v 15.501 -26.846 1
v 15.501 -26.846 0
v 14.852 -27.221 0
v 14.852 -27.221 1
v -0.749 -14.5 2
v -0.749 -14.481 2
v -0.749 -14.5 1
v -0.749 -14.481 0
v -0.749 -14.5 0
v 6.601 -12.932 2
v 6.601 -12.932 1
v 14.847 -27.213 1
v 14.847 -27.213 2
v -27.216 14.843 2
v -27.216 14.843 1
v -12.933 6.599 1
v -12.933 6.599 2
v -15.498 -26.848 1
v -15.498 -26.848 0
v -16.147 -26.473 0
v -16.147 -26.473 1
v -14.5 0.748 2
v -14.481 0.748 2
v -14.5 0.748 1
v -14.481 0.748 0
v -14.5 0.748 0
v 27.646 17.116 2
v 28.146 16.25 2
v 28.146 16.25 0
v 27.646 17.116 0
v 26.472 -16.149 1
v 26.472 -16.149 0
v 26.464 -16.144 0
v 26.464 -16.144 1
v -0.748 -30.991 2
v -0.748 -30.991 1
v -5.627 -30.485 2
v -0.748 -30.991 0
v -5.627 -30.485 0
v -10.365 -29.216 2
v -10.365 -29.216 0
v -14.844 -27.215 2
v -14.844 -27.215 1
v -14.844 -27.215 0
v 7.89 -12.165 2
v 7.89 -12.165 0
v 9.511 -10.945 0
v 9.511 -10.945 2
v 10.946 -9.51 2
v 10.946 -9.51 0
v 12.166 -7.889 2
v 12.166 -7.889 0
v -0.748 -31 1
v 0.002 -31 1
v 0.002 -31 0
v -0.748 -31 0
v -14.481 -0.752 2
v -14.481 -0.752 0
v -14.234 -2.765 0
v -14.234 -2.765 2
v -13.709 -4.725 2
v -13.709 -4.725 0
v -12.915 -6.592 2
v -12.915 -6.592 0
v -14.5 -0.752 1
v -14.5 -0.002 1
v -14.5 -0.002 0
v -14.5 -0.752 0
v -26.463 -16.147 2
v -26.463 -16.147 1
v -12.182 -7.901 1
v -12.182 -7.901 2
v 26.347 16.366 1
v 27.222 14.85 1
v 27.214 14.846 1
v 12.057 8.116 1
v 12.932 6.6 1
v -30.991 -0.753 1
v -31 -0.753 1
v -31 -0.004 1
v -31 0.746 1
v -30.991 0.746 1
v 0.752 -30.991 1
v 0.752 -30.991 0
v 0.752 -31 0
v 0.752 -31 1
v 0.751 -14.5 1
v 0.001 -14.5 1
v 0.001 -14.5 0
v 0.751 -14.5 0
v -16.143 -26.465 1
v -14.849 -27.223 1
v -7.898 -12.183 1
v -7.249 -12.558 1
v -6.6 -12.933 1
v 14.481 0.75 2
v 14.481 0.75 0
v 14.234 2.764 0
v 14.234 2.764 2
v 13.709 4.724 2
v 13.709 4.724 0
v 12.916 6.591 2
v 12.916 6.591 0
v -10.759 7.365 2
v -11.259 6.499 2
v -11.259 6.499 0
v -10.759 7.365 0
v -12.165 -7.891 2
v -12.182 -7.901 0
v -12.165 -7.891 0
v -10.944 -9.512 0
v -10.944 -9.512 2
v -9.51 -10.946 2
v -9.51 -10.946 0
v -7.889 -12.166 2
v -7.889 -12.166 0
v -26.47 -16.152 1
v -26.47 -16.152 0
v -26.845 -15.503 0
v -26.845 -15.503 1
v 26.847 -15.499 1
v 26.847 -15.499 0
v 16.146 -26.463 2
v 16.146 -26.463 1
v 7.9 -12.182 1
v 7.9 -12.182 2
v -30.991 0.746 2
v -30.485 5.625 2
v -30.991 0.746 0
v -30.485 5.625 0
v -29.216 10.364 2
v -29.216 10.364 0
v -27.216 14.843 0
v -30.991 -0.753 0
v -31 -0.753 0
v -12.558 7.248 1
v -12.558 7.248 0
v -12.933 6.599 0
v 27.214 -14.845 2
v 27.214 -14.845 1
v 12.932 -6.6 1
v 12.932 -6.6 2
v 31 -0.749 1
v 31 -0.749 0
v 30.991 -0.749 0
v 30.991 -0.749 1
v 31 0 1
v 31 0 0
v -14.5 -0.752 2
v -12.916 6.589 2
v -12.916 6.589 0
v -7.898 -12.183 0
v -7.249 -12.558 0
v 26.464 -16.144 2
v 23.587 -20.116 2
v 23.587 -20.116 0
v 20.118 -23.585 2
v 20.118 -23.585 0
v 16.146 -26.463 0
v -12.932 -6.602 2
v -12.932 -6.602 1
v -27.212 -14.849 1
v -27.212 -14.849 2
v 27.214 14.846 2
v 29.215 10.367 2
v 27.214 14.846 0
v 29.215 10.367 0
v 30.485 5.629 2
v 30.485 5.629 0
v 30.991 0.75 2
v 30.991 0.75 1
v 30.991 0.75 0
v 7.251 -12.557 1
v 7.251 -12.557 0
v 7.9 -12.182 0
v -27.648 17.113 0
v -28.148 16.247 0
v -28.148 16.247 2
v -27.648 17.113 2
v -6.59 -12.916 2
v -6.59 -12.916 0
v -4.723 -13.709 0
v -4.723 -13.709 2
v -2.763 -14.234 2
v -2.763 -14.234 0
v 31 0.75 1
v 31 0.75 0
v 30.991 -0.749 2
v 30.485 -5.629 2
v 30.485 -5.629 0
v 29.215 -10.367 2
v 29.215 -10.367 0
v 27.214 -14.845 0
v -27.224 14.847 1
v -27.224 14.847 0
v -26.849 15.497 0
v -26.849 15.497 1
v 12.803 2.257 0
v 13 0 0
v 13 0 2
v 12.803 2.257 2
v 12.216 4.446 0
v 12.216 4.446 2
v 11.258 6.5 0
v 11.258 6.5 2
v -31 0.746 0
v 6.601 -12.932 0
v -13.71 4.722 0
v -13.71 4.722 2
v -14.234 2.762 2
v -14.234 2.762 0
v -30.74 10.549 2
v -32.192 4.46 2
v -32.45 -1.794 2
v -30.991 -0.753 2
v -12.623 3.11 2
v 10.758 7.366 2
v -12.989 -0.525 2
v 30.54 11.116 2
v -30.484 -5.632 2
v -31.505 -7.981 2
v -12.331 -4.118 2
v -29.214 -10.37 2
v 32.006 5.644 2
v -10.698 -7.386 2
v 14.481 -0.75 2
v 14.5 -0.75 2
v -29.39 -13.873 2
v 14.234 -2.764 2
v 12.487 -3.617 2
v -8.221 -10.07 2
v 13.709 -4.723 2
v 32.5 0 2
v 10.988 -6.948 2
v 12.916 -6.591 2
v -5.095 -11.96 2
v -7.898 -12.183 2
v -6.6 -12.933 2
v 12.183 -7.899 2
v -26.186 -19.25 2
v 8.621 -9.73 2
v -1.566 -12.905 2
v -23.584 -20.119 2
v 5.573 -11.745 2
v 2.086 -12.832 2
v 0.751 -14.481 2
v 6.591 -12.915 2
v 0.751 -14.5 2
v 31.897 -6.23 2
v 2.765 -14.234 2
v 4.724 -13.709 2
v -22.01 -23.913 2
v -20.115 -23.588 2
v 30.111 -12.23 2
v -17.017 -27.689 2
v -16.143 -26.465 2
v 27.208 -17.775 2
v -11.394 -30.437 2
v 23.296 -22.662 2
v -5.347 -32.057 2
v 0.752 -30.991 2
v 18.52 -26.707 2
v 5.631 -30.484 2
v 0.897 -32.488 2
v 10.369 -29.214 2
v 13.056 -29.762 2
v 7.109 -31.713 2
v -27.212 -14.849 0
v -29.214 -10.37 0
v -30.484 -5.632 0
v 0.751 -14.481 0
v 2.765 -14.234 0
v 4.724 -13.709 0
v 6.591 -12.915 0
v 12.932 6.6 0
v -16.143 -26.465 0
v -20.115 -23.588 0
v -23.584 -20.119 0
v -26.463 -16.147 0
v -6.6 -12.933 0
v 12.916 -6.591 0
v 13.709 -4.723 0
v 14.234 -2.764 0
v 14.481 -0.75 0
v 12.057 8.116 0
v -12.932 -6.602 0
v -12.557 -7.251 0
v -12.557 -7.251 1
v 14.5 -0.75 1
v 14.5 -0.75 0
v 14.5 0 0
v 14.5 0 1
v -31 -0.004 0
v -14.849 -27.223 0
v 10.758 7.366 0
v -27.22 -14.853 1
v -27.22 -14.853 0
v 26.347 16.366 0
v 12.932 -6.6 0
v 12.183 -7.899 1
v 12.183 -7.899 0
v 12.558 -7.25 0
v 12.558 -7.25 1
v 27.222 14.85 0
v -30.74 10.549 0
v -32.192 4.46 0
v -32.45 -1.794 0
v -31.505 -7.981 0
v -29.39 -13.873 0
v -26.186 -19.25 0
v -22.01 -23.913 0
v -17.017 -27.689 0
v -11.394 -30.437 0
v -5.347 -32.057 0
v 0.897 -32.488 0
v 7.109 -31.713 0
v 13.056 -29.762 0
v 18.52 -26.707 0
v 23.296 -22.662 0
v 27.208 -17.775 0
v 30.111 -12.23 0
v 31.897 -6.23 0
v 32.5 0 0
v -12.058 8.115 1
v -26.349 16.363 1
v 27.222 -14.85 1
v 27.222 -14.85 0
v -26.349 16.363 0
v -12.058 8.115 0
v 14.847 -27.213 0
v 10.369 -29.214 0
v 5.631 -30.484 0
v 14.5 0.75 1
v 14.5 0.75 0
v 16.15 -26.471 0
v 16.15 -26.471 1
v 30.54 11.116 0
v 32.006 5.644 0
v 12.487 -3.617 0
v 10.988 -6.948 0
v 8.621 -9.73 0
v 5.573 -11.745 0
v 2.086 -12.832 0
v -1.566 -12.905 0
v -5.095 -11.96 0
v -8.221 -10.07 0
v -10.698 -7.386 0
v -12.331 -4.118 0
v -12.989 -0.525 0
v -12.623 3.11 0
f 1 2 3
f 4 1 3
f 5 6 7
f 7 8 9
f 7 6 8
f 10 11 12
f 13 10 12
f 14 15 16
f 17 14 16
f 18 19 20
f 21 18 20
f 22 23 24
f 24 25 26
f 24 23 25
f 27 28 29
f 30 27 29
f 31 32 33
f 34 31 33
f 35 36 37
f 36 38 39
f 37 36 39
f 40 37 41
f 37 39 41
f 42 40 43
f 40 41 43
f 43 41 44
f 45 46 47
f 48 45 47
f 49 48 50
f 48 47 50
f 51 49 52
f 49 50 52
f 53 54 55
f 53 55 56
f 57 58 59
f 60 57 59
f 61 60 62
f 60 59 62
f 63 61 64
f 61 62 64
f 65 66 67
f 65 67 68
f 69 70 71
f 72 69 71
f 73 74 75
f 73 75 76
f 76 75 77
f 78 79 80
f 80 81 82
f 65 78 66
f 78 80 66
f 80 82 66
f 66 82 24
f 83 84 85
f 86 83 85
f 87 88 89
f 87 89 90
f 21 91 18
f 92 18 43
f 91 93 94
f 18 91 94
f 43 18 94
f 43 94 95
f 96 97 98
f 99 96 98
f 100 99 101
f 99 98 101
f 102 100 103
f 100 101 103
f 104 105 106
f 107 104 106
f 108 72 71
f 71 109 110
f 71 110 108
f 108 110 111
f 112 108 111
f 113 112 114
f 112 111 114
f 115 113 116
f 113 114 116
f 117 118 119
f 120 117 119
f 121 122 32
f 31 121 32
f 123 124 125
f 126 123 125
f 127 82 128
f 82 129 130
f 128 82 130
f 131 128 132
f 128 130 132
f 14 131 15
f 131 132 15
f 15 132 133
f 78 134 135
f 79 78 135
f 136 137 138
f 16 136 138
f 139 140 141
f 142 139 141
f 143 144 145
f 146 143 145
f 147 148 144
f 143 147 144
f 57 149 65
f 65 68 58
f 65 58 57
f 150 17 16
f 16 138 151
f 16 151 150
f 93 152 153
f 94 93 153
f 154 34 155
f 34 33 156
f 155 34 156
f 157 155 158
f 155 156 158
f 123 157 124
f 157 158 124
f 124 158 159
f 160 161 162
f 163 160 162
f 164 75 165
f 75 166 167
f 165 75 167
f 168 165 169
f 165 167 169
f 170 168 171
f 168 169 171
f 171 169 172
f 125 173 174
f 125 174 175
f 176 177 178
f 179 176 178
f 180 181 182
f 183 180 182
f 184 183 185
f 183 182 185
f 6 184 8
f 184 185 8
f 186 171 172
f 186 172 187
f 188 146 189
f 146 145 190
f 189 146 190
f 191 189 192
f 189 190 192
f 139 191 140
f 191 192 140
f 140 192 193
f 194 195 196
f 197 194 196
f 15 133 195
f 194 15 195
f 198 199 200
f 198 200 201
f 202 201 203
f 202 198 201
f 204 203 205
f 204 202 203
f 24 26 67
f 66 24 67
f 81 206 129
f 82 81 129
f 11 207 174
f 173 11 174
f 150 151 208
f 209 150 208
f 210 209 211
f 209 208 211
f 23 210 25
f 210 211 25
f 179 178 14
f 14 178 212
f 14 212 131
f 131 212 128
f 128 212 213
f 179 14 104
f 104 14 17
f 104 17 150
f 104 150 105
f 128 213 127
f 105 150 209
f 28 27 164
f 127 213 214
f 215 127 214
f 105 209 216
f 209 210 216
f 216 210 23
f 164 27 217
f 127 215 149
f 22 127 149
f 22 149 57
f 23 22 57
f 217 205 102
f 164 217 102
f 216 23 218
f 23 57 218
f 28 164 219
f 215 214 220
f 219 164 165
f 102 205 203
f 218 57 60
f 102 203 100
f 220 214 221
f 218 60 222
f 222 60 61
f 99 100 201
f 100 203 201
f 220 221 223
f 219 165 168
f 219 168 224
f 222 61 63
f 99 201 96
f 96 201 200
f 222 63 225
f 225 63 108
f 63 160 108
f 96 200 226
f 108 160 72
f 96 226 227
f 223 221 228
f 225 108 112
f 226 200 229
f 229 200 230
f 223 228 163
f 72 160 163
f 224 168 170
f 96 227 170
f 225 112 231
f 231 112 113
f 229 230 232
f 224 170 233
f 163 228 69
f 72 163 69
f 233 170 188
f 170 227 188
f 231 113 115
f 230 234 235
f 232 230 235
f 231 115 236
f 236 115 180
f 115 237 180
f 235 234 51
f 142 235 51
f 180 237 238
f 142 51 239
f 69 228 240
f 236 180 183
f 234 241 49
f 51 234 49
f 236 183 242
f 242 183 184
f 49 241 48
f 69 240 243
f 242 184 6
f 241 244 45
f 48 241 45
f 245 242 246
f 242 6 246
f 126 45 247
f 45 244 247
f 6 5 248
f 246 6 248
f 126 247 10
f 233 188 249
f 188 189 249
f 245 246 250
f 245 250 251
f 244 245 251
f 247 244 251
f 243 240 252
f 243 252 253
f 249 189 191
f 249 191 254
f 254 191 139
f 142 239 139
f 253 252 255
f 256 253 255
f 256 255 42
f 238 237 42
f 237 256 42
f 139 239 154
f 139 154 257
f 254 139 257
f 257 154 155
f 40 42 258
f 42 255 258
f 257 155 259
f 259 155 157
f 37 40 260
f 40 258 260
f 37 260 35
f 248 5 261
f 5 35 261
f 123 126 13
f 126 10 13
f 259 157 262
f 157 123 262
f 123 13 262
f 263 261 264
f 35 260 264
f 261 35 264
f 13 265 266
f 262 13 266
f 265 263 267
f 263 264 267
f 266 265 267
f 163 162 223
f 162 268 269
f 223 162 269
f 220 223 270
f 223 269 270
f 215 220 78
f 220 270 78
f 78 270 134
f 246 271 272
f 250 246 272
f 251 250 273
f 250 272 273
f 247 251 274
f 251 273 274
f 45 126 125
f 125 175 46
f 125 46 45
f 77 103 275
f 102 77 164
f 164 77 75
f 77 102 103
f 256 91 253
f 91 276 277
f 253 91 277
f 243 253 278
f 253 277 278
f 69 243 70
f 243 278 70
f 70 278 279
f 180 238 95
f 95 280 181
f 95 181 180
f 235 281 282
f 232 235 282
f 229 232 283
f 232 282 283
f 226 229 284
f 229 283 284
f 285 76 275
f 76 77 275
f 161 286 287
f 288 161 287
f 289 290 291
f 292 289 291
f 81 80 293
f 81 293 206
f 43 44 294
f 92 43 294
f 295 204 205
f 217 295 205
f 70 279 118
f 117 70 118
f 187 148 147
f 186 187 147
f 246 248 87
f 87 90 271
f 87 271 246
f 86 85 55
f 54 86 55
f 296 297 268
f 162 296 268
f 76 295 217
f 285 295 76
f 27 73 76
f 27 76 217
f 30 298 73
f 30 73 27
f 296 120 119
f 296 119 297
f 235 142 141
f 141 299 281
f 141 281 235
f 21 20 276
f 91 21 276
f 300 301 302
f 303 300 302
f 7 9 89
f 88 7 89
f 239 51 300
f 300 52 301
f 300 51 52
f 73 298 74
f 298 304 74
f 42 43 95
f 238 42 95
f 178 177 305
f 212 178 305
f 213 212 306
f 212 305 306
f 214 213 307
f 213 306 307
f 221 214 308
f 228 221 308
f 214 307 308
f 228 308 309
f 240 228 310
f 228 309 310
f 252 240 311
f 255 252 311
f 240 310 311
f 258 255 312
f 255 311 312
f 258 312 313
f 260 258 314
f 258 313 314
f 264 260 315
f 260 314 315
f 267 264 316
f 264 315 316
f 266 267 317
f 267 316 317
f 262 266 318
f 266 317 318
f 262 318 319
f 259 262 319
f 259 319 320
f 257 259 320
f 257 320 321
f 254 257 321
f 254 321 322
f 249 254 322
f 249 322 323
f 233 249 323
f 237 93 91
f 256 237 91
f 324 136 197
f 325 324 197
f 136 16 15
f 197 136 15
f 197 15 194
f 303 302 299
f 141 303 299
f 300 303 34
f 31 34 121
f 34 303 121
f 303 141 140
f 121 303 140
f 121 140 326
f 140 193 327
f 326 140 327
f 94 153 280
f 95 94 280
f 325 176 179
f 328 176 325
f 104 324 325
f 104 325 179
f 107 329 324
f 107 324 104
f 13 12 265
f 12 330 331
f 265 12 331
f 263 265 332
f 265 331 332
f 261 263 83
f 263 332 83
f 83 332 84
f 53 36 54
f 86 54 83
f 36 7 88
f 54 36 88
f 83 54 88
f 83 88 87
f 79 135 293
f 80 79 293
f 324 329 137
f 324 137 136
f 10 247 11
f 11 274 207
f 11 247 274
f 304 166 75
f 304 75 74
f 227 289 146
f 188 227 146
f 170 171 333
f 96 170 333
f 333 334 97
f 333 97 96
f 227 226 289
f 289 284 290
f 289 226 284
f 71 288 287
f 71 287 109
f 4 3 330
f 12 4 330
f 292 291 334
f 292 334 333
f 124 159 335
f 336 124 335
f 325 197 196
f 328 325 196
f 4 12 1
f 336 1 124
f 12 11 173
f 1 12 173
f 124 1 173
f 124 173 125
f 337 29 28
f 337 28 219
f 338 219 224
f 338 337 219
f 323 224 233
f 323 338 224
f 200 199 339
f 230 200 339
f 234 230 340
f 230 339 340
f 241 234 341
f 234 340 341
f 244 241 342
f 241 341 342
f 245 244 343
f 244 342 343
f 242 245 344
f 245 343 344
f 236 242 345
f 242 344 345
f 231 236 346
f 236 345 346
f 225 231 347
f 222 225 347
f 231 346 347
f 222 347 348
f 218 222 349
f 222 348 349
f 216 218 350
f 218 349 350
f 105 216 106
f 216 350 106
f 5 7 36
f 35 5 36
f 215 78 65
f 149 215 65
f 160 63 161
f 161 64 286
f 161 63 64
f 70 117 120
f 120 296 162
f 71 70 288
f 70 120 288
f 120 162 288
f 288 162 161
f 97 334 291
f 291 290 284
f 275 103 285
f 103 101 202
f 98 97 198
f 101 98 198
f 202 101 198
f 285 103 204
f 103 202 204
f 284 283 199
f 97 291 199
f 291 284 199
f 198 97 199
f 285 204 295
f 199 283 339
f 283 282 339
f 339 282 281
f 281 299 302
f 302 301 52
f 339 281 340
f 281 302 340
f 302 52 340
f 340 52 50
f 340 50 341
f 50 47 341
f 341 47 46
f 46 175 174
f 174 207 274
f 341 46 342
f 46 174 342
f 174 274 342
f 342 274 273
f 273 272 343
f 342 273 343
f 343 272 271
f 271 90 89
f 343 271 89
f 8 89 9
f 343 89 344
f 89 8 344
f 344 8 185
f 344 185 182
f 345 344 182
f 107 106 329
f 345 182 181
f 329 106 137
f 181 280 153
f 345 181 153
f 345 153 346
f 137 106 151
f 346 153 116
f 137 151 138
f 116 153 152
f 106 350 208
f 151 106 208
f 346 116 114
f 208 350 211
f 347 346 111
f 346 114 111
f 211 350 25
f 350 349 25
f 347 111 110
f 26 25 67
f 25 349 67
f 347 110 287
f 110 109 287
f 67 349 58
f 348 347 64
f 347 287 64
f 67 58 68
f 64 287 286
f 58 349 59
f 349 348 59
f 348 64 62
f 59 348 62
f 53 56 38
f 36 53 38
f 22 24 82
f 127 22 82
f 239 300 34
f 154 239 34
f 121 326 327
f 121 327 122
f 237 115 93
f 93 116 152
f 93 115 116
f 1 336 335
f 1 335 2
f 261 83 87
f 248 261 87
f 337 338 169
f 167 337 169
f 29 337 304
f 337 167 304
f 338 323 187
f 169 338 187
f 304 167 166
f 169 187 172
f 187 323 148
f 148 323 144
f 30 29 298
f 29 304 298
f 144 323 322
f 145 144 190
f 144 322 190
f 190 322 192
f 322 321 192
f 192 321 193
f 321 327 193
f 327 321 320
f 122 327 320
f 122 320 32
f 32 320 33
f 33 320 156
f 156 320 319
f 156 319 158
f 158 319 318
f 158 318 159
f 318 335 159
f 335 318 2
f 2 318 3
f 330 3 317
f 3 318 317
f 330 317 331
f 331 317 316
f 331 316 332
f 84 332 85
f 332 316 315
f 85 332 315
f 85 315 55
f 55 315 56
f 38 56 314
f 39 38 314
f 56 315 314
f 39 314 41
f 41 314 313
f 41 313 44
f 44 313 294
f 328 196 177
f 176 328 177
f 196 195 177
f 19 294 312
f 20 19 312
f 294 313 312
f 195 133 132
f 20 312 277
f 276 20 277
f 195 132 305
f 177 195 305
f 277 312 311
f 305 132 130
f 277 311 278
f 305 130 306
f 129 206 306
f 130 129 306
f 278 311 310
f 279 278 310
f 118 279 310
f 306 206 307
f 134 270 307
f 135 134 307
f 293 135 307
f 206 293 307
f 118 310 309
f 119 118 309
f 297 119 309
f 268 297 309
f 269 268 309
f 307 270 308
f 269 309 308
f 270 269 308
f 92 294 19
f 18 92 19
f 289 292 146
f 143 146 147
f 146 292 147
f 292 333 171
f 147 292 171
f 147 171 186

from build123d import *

# Parameters (mm, degrees)
BOSS_EXTRU_1_DEPTH             = 2
ESQUISSE2_W                    = 16.5
ESQUISSE2_H                    = 1
ENL_V_MAT_EXTRU_1_DEPTH        = 0.75
ESQUISSE3_W                    = 16.5
ESQUISSE3_H                    = 1
ENL_V_MAT_EXTRU_2_DEPTH        = 0.75
R_P_TITION_CIRCULAIRE1_DEPTH   = 2
R_P_TITION_START               = 1
R_P_TITION_CIRCULAIRE1_2_DEPTH = 1
BOSS_EXTRU_2_DEPTH             = 1
BOSS_EXTRU_3_DEPTH             = 1


# Read off the part's stored shape, not the designer's step: Répétition circulaire1
with BuildPart() as part:
    # Esquisse1 → Boss.-Extru.1 (new body)
    with BuildSketch(Plane.XY):
        with BuildLine():
            Line((11.258330249, 6.5), (28.145825623, 16.25))
            ThreePointArc((28.145825623, 16.25), (31.392589354, 8.411618966), (32.5, 0))
            Line((32.5, 0), (13, 0))
            ThreePointArc((13, 0), (12.557035742, 3.364647586), (11.258330249, 6.5))
        make_face()
        with BuildLine():
            Line((12.915559198, 6.590776176), (27.213929282, 14.845943993))
            ThreePointArc((27.213929282, 14.845943993), (29.943700615, 8.023390398), (30.990926091, 0.75))
            Line((30.990926091, 0.75), (14.480590458, 0.75))
            ThreePointArc((14.480590458, 0.75), (14.005924481, 3.752876154), (12.915559198, 6.590776176))
        make_face(mode=Mode.SUBTRACT)
    extrude(amount=BOSS_EXTRU_1_DEPTH)

    # Esquisse2 → Enlèv. mat.-Extru.1 (cut)
    with BuildSketch(Plane(origin=(0, 0, 0), x_dir=(0.866025403784438, 0.5000000000000011, 0), z_dir=(-0.5000000000000011, 0.8660254037844382, 0))):
        with Locations((22.75, -0.5)):
            Rectangle(ESQUISSE2_W, ESQUISSE2_H)
    extrude(amount=-ENL_V_MAT_EXTRU_1_DEPTH, mode=Mode.SUBTRACT)

    # Esquisse3 → Enlèv. mat.-Extru.2 (cut)
    with BuildSketch(Plane.XZ):
        with Locations((22.75, 0.5)):
            Rectangle(ESQUISSE3_W, ESQUISSE3_H)
    extrude(amount=-ENL_V_MAT_EXTRU_2_DEPTH, mode=Mode.SUBTRACT)

    # Répétition circulaire1 outline → Répétition circulaire1 (add)
    with BuildSketch(Plane.XY):
        with BuildLine():
            Line((14.500000002, 0), (13, 0))
            ThreePointArc((13, 0), (-3.363880515, -12.557241253), (-11.25912429, 6.498624487))
            Line((-11.25912429, 6.498624487), (-12.558254016, 7.248465774))
            Line((-12.558254016, 7.248465774), (-12.933174659, 6.598900911))
            Line((-12.933174659, 6.598900911), (-12.916364317, 6.589198194))
            ThreePointArc((-12.916364317, 6.589198194), (-14.006382877, 3.75116498), (-14.480681979, 0.748230857))
            Line((-14.480681979, 0.748230857), (-14.500091522, 0.748228486))
            Line((-14.500091522, 0.748228486), (-14.499999892, -0.001771509))
            Line((-14.499999892, -0.001771509), (-14.499921381, -0.751518432))
            Line((-14.499921381, -0.751518432), (-14.480511838, -0.7515164))
            ThreePointArc((-14.480511838, -0.7515164), (-14.005531404, -3.75434283), (-12.914868943, -6.592128654))
            Line((-12.914868943, -6.592128654), (-12.931677083, -6.601835185))
            Line((-12.931677083, -6.601835185), (-12.556609068, -7.251314965))
            Line((-12.556609068, -7.251314965), (-12.181678945, -7.900582135))
            Line((-12.181678945, -7.900582135), (-12.164870636, -7.890875897))
            ThreePointArc((-12.164870636, -7.890875897), (-10.252153541, -10.253943035), (-7.888752606, -12.166247668))
            Line((-7.888752606, -12.166247668), (-7.898455911, -12.183057672))
            Line((-7.898455911, -12.183057672), (-7.248904135, -12.558000989))
            Line((-7.248904135, -12.558000989), (-6.599578081, -12.932829124))
            Line((-6.599578081, -12.932829124), (-6.589874484, -12.91601929))
            ThreePointArc((-6.589874484, -12.91601929), (-3.751898347, -14.006186447), (-0.748989062, -14.480642782))
            Line((-0.748989062, -14.480642782), (-0.748987707, -14.500052325))
            Line((-0.748987707, -14.500052325), (0.001012291, -14.499999965))
            Line((0.001012291, -14.499999965), (0.750759217, -14.49996071))
            Line((0.750759217, -14.49996071), (0.750758201, -14.480551168))
            ThreePointArc((0.750758201, -14.480551168), (3.753609497, -14.005727962), (6.591452424, -12.915214088))
            Line((6.591452424, -12.915214088), (6.601158075, -12.932022737))
            Line((6.601158075, -12.932022737), (7.250657492, -12.556988728))
            Line((7.250657492, -12.556988728), (7.899944293, -12.182092602))
            Line((7.899944293, -12.182092602), (7.890238935, -12.165283784))
            ThreePointArc((7.890238935, -12.165283784), (10.25340622, -10.252690422), (12.165834597, -7.889389619))
            Line((12.165834597, -7.889389619), (12.182644093, -7.899093804))
            Line((12.182644093, -7.899093804), (12.55762142, -7.249561661))
            Line((12.55762142, -7.249561661), (12.932483553, -6.600255234))
            Line((12.932483553, -6.600255234), (12.915674227, -6.590550756))
            ThreePointArc((12.915674227, -6.590550756), (14.005989979, -3.752631704), (14.480603545, -0.749747266))
            Line((14.480603545, -0.749747266), (14.500013088, -0.749746927))
            Line((14.500013088, -0.749746927), (14.500000002, 0))
        make_face()
        with BuildLine():
            Line((32.5, 0), (31.000000004, 0))
            Line((31.000000004, 0), (31.000013085, -0.749458948))
            Line((31.000013085, -0.749458948), (30.990939177, -0.749459106))
            ThreePointArc((30.990939177, -0.749459106), (29.943840645, -8.022867781), (27.214188388, -14.845469018))
            Line((27.214188388, -14.845469018), (27.222046703, -14.850005835))
            Line((27.222046703, -14.850005835), (26.847328557, -15.499062863))
            Line((26.847328557, -15.499062863), (26.472351226, -16.148595003))
            Line((26.472351226, -16.148595003), (26.464492832, -16.144058323))
            ThreePointArc((26.464492832, -16.144058323), (21.921075367, -21.91954504), (16.145905854, -26.4633657))
            Line((16.145905854, -26.4633657), (16.150443083, -26.471223777))
            Line((16.150443083, -26.471223777), (15.501405676, -26.845975906))
            Line((15.501405676, -26.845975906), (14.851906256, -27.221009911))
            Line((14.851906256, -27.221009911), (14.847368891, -27.213151913))
            ThreePointArc((14.847368891, -27.213151913), (8.024958236, -29.94328047), (0.75162268, -30.990886779))
            Line((0.75162268, -30.990886779), (0.751623155, -30.999960688))
            Line((0.751623155, -30.999960688), (0.002164208, -30.999999929))
            Line((0.002164208, -30.999999929), (-0.74783579, -31.000052284))
            Line((-0.74783579, -31.000052284), (-0.747836423, -30.990978376))
            ThreePointArc((-0.747836423, -30.990978376), (-8.021299914, -29.94426068), (-14.844044066, -27.214965658))
            Line((-14.844044066, -27.214965658), (-14.848580472, -27.22282421))
            Line((-14.848580472, -27.22282421), (-15.497657119, -26.848140049))
            Line((-15.497657119, -26.848140049), (-16.147208892, -26.473196728))
            Line((-16.147208892, -26.473196728), (-16.142672624, -26.465338097))
            ThreePointArc((-16.142672624, -26.465338097), (-21.918397225, -21.922223041), (-26.462520266, -16.147291451))
            Line((-26.462520266, -16.147291451), (-26.470378105, -16.151829091))
            Line((-26.470378105, -16.151829091), (-26.845164218, -15.502811306))
            Line((-26.845164218, -15.502811306), (-27.220232229, -14.853331525))
            Line((-27.220232229, -14.853331525), (-27.212374469, -14.848793747))
            ThreePointArc((-27.212374469, -14.848793747), (-29.942860243, -8.026526051), (-30.990847382, -0.753245358))
            Line((-30.990847382, -0.753245358), (-30.99992129, -0.753246308))
            Line((-30.99992129, -0.753246308), (-30.999999773, -0.003787364))
            Line((-30.999999773, -0.003787364), (-31.000091398, 0.74621263))
            Line((-31.000091398, 0.74621263), (-30.99101749, 0.746213739))
            ThreePointArc((-30.99101749, 0.746213739), (-29.944680634, 8.019732025), (-27.215742853, 14.842619073))
            Line((-27.215742853, 14.842619073), (-27.223601643, 14.847155068))
            Line((-27.223601643, 14.847155068), (-26.848680999, 15.49671993))
            Line((-26.848680999, 15.49671993), (-28.147810725, 16.246561217))
            ThreePointArc((-28.147810725, 16.246561217), (-8.409701286, -31.393103132), (32.5, 0))
        make_face()
    extrude(amount=R_P_TITION_CIRCULAIRE1_DEPTH)

    # R_p_tition circulaire1 2 outline → R_p_tition circulaire1 2 (add)
    with BuildSketch(Plane.XY.offset(R_P_TITION_START)):
        Polygon((31.000000004, 0), (14.500000002, 0), (14.500013088, -0.749746927), (30.990939177, -0.749459106), (31.000013085, -0.749458948), align=None)
        Polygon((-12.933174659, 6.598900911), (-12.558254016, 7.248465774), (-26.848680999, 15.49671993), (-27.223601643, 14.847155068), (-27.215742853, 14.842619073), align=None)
        Polygon((27.222046703, -14.850005835), (27.214188388, -14.845469018), (12.932483553, -6.600255234), (12.557621422, -7.249561662), (12.182644093, -7.899093803), (26.464492832, -16.144058323), (26.472351226, -16.148595003), (26.847328553, -15.499062861), align=None)
        Polygon((-14.500091522, 0.748228486), (-30.99101749, 0.746213739), (-31.000091398, 0.74621263), (-30.999999769, -0.003787364), (-30.99992129, -0.753246308), (-30.990847382, -0.753245358), (-14.499921381, -0.751518433), (-14.499999894, -0.001771509), align=None)
        Polygon((16.150443083, -26.471223777), (16.145905854, -26.4633657), (7.899944293, -12.182092602), (7.250657493, -12.55698873), (6.601158075, -12.932022737), (14.84736889, -27.213151913), (14.851906256, -27.221009911), (15.501405673, -26.845975902), align=None)
        Polygon((-12.931677083, -6.601835185), (-27.212374469, -14.848793747), (-27.220232229, -14.853331525), (-26.845164214, -15.502811304), (-26.470378105, -16.151829091), (-26.462520266, -16.147291451), (-12.181678945, -7.900582135), (-12.55660907, -7.251314966), align=None)
        Polygon((0.751623155, -30.999960688), (0.75162268, -30.990886779), (0.750759217, -14.49996071), (0.001012291, -14.499999967), (-0.748987707, -14.500052325), (-0.747836423, -30.990978376), (-0.74783579, -31.000052284), (0.002164208, -30.999999924), align=None)
        Polygon((-7.898455911, -12.183057672), (-16.142672624, -26.465338097), (-16.147208892, -26.473196728), (-15.497657117, -26.848140045), (-14.848580472, -27.22282421), (-14.844044066, -27.214965658), (-6.599578081, -12.932829124), (-7.248904136, -12.558000991), align=None)
    extrude(amount=R_P_TITION_CIRCULAIRE1_2_DEPTH)

    # Esquisse5 → Boss.-Extru.2 (add)
    with BuildSketch(Plane(origin=(0, 0, 0), x_dir=(0.866025403784438, 0.5000000000000011, 0), z_dir=(-0.5000000000000011, 0.8660254037844382, 0))):
        Polygon((32.5, 0), (31, 0), (31, -1), (14.5, -1), (14.5, 0), (13, 0), (13, -2), (32.5, -2), align=None)
    extrude(amount=BOSS_EXTRU_2_DEPTH)

    # Esquisse6 → Boss.-Extru.3 (add)
    with BuildSketch(Plane(origin=(0, 0, 0), x_dir=(0.8660864838448452, -0.4998941913057929, 0), z_dir=(0.49989419130579293, 0.8660864838448453, 0))):
        Polygon((-14.5, -1), (-31, -1), (-31, 0), (-32.5, 0), (-32.5, -2), (-13, -2), (-13, 0), (-14.5, 0), align=None)
    extrude(amount=BOSS_EXTRU_3_DEPTH)


solid = part.part
